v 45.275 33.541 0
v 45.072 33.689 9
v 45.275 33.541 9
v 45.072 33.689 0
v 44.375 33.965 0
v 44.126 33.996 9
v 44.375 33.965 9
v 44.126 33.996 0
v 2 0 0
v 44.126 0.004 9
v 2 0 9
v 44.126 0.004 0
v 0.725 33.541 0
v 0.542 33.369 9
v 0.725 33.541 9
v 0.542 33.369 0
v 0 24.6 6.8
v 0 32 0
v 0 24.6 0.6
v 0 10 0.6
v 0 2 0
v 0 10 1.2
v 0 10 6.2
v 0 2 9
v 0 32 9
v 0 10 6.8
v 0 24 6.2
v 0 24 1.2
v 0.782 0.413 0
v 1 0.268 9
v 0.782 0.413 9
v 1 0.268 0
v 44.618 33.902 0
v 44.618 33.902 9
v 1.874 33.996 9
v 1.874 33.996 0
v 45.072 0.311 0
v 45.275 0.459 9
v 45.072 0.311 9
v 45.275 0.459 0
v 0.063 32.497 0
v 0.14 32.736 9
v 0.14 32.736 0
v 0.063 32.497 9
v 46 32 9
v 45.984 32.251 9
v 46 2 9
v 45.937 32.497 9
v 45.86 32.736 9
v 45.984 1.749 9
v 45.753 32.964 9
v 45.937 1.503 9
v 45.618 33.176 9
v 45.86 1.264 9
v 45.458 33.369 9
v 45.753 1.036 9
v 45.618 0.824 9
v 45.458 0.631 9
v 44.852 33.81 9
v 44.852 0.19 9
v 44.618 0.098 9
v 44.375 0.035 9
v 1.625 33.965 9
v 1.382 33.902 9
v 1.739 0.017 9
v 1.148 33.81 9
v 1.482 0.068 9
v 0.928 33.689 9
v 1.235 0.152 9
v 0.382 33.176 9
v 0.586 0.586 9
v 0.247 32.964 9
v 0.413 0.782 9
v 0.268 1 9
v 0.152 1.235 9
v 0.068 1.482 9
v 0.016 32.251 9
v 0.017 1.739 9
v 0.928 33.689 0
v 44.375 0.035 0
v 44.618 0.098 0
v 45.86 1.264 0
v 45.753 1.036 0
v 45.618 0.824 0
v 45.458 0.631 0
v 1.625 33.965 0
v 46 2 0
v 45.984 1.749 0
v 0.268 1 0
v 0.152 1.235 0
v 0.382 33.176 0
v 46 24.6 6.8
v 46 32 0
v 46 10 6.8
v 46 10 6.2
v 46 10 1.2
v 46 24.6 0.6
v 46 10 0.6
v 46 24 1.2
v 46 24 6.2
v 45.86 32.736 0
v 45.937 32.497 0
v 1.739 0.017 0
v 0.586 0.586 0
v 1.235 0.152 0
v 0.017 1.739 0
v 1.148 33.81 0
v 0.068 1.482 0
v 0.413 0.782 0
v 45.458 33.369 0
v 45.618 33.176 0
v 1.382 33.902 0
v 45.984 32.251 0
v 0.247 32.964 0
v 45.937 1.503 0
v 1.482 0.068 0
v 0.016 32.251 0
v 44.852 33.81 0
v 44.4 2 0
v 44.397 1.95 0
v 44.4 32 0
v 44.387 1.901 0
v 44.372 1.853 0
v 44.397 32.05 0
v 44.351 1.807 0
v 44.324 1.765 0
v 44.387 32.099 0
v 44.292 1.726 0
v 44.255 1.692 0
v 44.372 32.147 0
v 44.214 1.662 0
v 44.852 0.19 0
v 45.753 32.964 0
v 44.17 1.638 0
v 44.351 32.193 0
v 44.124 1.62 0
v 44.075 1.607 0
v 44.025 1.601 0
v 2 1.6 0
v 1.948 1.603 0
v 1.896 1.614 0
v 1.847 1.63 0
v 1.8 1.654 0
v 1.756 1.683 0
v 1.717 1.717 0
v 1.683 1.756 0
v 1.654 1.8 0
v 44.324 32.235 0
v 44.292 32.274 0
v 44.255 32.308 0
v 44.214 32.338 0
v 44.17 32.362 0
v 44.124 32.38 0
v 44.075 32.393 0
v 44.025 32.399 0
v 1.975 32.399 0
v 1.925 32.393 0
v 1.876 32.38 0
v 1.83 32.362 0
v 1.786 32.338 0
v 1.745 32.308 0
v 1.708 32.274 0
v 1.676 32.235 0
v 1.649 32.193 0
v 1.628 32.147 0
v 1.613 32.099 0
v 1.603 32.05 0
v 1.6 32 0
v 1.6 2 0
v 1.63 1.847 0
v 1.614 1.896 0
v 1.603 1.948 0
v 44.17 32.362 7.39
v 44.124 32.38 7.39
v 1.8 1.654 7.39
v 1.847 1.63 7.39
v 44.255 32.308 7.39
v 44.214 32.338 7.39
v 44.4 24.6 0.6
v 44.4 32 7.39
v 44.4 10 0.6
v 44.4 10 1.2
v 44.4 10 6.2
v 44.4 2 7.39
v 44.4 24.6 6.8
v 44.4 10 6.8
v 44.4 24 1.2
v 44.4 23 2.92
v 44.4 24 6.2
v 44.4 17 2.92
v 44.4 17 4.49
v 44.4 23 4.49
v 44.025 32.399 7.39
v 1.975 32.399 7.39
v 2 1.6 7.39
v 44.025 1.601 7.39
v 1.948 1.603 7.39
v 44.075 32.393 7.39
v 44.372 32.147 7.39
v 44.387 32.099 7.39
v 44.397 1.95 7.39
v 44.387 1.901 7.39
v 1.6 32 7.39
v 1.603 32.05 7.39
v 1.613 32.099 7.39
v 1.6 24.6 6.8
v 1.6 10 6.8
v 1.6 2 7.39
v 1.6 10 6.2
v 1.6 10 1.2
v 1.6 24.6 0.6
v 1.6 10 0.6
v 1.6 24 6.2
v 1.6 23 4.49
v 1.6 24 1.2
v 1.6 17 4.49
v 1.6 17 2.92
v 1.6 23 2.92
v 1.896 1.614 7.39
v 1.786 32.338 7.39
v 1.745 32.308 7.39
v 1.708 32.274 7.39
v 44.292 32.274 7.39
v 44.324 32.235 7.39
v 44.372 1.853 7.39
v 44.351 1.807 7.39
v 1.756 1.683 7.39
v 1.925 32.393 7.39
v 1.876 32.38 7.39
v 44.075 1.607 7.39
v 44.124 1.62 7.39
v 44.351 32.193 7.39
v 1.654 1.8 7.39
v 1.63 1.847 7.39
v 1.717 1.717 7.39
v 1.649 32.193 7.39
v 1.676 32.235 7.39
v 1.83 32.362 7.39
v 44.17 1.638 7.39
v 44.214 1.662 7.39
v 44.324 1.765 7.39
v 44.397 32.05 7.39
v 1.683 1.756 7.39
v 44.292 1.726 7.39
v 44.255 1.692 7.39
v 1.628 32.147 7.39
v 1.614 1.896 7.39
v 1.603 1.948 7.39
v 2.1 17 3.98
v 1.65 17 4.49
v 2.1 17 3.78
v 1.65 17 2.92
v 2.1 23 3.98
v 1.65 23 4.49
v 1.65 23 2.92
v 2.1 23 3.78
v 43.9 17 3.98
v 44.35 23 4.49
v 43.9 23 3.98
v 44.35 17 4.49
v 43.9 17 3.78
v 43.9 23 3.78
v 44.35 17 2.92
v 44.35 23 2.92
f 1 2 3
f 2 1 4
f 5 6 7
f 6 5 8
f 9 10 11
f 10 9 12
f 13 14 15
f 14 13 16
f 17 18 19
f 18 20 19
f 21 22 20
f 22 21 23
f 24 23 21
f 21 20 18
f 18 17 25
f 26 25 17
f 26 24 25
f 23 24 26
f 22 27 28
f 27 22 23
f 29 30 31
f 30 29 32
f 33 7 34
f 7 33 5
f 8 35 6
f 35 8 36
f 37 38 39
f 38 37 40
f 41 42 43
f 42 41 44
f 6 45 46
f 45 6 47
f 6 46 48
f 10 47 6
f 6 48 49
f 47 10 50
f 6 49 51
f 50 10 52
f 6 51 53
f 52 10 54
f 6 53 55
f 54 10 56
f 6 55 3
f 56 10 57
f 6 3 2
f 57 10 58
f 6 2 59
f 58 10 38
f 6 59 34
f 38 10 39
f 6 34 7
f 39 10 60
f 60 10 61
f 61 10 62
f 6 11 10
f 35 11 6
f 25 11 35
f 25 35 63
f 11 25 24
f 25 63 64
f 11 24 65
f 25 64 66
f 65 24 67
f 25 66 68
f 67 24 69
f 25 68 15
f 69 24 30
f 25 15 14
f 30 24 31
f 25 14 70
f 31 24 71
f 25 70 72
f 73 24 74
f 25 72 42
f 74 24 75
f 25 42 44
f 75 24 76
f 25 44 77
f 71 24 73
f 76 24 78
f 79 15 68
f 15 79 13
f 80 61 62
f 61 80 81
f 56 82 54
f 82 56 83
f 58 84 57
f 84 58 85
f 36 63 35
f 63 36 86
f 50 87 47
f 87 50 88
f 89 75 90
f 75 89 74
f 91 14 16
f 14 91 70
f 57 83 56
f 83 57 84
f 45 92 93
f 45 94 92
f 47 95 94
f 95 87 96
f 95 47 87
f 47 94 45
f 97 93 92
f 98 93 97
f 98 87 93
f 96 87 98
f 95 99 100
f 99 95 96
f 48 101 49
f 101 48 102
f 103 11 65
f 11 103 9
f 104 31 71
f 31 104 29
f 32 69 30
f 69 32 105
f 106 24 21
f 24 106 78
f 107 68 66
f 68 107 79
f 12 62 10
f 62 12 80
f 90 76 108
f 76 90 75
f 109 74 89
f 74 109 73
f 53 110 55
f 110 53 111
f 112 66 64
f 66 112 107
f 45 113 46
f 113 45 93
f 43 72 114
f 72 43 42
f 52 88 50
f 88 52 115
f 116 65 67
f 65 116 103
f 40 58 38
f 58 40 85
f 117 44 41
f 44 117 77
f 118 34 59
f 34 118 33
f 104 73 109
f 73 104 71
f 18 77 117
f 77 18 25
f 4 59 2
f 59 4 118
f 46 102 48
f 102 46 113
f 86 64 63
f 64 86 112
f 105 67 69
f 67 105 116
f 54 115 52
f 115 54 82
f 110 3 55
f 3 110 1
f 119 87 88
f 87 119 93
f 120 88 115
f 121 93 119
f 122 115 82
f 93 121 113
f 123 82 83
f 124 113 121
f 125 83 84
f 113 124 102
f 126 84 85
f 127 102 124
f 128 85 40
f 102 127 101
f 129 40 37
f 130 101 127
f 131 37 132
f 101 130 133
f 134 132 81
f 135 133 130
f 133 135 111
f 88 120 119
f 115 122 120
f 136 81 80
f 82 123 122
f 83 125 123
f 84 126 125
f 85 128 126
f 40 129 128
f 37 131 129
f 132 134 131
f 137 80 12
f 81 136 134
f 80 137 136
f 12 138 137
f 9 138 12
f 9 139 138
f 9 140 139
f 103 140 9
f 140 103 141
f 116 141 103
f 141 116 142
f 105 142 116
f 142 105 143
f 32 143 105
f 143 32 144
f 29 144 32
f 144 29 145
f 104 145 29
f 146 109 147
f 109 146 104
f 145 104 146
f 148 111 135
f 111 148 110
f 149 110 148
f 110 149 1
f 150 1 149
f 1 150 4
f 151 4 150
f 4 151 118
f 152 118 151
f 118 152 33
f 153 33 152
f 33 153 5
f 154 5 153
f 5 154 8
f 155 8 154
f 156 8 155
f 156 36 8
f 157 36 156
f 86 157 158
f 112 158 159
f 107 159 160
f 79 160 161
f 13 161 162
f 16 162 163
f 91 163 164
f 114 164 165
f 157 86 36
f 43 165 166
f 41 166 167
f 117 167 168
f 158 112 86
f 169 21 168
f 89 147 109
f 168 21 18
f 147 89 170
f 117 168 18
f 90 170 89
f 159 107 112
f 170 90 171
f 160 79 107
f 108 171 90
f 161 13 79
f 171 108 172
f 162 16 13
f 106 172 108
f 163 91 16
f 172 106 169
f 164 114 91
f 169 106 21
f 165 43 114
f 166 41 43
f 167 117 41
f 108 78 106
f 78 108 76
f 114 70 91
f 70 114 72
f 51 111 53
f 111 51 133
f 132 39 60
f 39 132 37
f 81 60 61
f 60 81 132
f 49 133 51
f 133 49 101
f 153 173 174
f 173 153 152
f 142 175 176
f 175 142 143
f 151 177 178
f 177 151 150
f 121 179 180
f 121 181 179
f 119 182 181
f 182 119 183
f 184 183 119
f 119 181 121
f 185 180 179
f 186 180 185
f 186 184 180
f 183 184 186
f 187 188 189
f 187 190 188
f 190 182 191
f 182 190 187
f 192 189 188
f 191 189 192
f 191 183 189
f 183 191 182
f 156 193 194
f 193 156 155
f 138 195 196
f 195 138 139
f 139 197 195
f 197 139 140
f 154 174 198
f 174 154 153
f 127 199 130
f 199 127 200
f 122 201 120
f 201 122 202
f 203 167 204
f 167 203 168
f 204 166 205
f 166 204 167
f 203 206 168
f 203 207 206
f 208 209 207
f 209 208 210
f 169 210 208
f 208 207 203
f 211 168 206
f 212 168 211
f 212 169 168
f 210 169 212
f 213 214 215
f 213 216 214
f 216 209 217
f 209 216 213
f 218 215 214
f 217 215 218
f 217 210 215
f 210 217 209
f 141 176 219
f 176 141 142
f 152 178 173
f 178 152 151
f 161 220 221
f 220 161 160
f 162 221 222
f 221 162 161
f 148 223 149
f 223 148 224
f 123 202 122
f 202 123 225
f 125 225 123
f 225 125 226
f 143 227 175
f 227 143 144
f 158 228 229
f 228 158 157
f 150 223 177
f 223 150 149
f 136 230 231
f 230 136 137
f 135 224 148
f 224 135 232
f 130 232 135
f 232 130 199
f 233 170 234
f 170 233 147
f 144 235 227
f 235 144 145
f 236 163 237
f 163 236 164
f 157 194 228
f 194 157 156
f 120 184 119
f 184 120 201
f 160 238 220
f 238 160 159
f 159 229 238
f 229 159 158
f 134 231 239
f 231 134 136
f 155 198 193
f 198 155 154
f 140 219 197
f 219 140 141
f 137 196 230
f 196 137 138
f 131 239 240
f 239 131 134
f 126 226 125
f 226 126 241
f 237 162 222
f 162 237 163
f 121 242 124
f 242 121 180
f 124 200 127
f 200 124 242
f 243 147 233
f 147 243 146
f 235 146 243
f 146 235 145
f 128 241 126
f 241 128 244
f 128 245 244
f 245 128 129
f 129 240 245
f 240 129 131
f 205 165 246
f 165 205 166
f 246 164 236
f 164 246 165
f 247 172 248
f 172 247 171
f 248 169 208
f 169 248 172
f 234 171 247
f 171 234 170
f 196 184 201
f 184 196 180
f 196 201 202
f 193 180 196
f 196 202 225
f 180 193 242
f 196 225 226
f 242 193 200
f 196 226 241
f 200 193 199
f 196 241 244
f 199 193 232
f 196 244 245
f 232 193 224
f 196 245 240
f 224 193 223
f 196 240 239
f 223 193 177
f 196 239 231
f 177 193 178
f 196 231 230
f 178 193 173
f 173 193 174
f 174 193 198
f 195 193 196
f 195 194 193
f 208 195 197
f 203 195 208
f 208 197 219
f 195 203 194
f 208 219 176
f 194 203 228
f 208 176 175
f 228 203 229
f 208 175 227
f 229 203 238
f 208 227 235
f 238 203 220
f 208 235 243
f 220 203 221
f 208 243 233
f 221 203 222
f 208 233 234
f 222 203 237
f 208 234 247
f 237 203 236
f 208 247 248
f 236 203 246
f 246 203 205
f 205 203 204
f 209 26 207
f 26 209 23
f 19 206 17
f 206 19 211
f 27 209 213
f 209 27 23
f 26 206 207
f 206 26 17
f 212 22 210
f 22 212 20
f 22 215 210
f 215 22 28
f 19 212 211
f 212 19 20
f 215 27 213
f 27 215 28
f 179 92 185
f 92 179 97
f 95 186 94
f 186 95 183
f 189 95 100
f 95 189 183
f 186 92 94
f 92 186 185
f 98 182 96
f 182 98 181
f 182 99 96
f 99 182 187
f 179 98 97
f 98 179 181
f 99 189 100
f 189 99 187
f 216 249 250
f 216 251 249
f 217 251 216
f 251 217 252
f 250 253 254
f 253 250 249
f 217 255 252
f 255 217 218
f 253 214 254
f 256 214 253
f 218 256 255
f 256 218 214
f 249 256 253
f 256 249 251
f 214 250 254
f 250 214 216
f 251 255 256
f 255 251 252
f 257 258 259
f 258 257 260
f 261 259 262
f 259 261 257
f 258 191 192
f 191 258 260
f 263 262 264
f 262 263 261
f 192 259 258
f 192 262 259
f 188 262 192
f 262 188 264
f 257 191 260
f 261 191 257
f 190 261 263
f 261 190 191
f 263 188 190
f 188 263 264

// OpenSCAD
$fn=48;
translate([0,0,0])
{
union()
{
    difference()
    {
        translate(v = [2.00, 2.00, 0.00])
        {
            hull()
            {
                cylinder(center = false, r1 = 2, r2 = 2, h = 9);
                translate(v = [42.00, 0.00, 0.00])
                {
                    cylinder(center = false, r1 = 2, r2 = 2, h = 9, $fn = 50);
                }
                translate(v = [0.00, 30.00, 0.00])
                {
                    cylinder(center = false, r1 = 2, r2 = 2, h = 9, $fn = 50);
                }
                translate(v = [42.00, 30.00, 0.00])
                {
                    cylinder(center = false, r1 = 2, r2 = 2, h = 9, $fn = 50);
                }
            }
        }
        translate(v = [1.60, 1.60, -0.01])
        {
            translate(v = [0.40, 0.40, 0.00])
            {
                hull()
                {
                    cylinder(center = false, r1 = 0.3999999999999999, r2 = 0.3999999999999999, h = 7.4);
                    translate(v = [42.00, 0.00, 0.00])
                    {
                        cylinder(center = false, r1 = 0.3999999999999999, r2 = 0.3999999999999999, h = 7.4, $fn = 50);
                    }
                    translate(v = [0.00, 30.00, 0.00])
                    {
                        cylinder(center = false, r1 = 0.3999999999999999, r2 = 0.3999999999999999, h = 7.4, $fn = 50);
                    }
                    translate(v = [42.00, 30.00, 0.00])
                    {
                        cylinder(center = false, r1 = 0.3999999999999999, r2 = 0.3999999999999999, h = 7.4, $fn = 50);
                    }
                }
            }
        }
        translate(v = [1.60, 24.60, 0.00])
        {
            rotate([90.00, 0.00, 0.00])
            {
                translate(v = [-1.65, 6.20, 0.00])
                {
                    cube(size = [1.70, 0.60, 14.60], center = false); 
                }
            }
        }
        translate(v = [1.60, 24.60, 0.00])
        {
            rotate([90.00, 0.00, 0.00])
            {
                translate(v = [-1.65, 0.60, 0.00])
                {
                    cube(size = [1.70, 0.60, 14.60], center = false); 
                }
            }
        }
        translate(v = [1.60, 24.60, 0.00])
        {
            rotate([90.00, 0.00, 0.00])
            {
                translate(v = [-1.65, 0.60, 0.00])
                {
                    cube(size = [1.70, 6.20, 0.60], center = false); 
                }
            }
        }
        translate(v = [44.40, 10.00, 0.00])
        {
            rotate([90.00, 0.00, 180.00])
            {
                translate(v = [-1.65, 6.20, 0.00])
                {
                    cube(size = [1.70, 0.60, 14.60], center = false); 
                }
            }
        }
        translate(v = [44.40, 10.00, 0.00])
        {
            rotate([90.00, 0.00, 180.00])
            {
                translate(v = [-1.65, 0.60, 0.00])
                {
                    cube(size = [1.70, 0.60, 14.60], center = false); 
                }
            }
        }
        translate(v = [44.40, 24.00, 0.00])
        {
            rotate([90.00, 0.00, 180.00])
            {
                translate(v = [-1.65, 0.60, 0.00])
                {
                    cube(size = [1.70, 6.20, 0.60], center = false); 
                }
            }
        }
    }
    translate(v = [1.60, 23.00, 0.00])
    {
        rotate([90.00, 0.00, 0.00])
        {
            hull()
            {
                translate(v = [0.00, 2.92, 0.00])
                {
                    cube(size = [0.05, 1.57, 6.00], center = false); 
                }
                translate(v = [0.45, 3.78, 0.00])
                {
                    cube(size = [0.05, 0.20, 6.00], center = false); 
                }
            }
        }
    }
    translate(v = [44.40, 17.00, 0.00])
    {
        rotate([90.00, 0.00, 180.00])
        {
            hull()
            {
                translate(v = [0.00, 2.92, 0.00])
                {
                    cube(size = [0.05, 1.57, 6.00], center = false); 
                }
                translate(v = [0.45, 3.78, 0.00])
                {
                    cube(size = [0.05, 0.20, 6.00], center = false); 
                }
            }
        }
    }
}

}
